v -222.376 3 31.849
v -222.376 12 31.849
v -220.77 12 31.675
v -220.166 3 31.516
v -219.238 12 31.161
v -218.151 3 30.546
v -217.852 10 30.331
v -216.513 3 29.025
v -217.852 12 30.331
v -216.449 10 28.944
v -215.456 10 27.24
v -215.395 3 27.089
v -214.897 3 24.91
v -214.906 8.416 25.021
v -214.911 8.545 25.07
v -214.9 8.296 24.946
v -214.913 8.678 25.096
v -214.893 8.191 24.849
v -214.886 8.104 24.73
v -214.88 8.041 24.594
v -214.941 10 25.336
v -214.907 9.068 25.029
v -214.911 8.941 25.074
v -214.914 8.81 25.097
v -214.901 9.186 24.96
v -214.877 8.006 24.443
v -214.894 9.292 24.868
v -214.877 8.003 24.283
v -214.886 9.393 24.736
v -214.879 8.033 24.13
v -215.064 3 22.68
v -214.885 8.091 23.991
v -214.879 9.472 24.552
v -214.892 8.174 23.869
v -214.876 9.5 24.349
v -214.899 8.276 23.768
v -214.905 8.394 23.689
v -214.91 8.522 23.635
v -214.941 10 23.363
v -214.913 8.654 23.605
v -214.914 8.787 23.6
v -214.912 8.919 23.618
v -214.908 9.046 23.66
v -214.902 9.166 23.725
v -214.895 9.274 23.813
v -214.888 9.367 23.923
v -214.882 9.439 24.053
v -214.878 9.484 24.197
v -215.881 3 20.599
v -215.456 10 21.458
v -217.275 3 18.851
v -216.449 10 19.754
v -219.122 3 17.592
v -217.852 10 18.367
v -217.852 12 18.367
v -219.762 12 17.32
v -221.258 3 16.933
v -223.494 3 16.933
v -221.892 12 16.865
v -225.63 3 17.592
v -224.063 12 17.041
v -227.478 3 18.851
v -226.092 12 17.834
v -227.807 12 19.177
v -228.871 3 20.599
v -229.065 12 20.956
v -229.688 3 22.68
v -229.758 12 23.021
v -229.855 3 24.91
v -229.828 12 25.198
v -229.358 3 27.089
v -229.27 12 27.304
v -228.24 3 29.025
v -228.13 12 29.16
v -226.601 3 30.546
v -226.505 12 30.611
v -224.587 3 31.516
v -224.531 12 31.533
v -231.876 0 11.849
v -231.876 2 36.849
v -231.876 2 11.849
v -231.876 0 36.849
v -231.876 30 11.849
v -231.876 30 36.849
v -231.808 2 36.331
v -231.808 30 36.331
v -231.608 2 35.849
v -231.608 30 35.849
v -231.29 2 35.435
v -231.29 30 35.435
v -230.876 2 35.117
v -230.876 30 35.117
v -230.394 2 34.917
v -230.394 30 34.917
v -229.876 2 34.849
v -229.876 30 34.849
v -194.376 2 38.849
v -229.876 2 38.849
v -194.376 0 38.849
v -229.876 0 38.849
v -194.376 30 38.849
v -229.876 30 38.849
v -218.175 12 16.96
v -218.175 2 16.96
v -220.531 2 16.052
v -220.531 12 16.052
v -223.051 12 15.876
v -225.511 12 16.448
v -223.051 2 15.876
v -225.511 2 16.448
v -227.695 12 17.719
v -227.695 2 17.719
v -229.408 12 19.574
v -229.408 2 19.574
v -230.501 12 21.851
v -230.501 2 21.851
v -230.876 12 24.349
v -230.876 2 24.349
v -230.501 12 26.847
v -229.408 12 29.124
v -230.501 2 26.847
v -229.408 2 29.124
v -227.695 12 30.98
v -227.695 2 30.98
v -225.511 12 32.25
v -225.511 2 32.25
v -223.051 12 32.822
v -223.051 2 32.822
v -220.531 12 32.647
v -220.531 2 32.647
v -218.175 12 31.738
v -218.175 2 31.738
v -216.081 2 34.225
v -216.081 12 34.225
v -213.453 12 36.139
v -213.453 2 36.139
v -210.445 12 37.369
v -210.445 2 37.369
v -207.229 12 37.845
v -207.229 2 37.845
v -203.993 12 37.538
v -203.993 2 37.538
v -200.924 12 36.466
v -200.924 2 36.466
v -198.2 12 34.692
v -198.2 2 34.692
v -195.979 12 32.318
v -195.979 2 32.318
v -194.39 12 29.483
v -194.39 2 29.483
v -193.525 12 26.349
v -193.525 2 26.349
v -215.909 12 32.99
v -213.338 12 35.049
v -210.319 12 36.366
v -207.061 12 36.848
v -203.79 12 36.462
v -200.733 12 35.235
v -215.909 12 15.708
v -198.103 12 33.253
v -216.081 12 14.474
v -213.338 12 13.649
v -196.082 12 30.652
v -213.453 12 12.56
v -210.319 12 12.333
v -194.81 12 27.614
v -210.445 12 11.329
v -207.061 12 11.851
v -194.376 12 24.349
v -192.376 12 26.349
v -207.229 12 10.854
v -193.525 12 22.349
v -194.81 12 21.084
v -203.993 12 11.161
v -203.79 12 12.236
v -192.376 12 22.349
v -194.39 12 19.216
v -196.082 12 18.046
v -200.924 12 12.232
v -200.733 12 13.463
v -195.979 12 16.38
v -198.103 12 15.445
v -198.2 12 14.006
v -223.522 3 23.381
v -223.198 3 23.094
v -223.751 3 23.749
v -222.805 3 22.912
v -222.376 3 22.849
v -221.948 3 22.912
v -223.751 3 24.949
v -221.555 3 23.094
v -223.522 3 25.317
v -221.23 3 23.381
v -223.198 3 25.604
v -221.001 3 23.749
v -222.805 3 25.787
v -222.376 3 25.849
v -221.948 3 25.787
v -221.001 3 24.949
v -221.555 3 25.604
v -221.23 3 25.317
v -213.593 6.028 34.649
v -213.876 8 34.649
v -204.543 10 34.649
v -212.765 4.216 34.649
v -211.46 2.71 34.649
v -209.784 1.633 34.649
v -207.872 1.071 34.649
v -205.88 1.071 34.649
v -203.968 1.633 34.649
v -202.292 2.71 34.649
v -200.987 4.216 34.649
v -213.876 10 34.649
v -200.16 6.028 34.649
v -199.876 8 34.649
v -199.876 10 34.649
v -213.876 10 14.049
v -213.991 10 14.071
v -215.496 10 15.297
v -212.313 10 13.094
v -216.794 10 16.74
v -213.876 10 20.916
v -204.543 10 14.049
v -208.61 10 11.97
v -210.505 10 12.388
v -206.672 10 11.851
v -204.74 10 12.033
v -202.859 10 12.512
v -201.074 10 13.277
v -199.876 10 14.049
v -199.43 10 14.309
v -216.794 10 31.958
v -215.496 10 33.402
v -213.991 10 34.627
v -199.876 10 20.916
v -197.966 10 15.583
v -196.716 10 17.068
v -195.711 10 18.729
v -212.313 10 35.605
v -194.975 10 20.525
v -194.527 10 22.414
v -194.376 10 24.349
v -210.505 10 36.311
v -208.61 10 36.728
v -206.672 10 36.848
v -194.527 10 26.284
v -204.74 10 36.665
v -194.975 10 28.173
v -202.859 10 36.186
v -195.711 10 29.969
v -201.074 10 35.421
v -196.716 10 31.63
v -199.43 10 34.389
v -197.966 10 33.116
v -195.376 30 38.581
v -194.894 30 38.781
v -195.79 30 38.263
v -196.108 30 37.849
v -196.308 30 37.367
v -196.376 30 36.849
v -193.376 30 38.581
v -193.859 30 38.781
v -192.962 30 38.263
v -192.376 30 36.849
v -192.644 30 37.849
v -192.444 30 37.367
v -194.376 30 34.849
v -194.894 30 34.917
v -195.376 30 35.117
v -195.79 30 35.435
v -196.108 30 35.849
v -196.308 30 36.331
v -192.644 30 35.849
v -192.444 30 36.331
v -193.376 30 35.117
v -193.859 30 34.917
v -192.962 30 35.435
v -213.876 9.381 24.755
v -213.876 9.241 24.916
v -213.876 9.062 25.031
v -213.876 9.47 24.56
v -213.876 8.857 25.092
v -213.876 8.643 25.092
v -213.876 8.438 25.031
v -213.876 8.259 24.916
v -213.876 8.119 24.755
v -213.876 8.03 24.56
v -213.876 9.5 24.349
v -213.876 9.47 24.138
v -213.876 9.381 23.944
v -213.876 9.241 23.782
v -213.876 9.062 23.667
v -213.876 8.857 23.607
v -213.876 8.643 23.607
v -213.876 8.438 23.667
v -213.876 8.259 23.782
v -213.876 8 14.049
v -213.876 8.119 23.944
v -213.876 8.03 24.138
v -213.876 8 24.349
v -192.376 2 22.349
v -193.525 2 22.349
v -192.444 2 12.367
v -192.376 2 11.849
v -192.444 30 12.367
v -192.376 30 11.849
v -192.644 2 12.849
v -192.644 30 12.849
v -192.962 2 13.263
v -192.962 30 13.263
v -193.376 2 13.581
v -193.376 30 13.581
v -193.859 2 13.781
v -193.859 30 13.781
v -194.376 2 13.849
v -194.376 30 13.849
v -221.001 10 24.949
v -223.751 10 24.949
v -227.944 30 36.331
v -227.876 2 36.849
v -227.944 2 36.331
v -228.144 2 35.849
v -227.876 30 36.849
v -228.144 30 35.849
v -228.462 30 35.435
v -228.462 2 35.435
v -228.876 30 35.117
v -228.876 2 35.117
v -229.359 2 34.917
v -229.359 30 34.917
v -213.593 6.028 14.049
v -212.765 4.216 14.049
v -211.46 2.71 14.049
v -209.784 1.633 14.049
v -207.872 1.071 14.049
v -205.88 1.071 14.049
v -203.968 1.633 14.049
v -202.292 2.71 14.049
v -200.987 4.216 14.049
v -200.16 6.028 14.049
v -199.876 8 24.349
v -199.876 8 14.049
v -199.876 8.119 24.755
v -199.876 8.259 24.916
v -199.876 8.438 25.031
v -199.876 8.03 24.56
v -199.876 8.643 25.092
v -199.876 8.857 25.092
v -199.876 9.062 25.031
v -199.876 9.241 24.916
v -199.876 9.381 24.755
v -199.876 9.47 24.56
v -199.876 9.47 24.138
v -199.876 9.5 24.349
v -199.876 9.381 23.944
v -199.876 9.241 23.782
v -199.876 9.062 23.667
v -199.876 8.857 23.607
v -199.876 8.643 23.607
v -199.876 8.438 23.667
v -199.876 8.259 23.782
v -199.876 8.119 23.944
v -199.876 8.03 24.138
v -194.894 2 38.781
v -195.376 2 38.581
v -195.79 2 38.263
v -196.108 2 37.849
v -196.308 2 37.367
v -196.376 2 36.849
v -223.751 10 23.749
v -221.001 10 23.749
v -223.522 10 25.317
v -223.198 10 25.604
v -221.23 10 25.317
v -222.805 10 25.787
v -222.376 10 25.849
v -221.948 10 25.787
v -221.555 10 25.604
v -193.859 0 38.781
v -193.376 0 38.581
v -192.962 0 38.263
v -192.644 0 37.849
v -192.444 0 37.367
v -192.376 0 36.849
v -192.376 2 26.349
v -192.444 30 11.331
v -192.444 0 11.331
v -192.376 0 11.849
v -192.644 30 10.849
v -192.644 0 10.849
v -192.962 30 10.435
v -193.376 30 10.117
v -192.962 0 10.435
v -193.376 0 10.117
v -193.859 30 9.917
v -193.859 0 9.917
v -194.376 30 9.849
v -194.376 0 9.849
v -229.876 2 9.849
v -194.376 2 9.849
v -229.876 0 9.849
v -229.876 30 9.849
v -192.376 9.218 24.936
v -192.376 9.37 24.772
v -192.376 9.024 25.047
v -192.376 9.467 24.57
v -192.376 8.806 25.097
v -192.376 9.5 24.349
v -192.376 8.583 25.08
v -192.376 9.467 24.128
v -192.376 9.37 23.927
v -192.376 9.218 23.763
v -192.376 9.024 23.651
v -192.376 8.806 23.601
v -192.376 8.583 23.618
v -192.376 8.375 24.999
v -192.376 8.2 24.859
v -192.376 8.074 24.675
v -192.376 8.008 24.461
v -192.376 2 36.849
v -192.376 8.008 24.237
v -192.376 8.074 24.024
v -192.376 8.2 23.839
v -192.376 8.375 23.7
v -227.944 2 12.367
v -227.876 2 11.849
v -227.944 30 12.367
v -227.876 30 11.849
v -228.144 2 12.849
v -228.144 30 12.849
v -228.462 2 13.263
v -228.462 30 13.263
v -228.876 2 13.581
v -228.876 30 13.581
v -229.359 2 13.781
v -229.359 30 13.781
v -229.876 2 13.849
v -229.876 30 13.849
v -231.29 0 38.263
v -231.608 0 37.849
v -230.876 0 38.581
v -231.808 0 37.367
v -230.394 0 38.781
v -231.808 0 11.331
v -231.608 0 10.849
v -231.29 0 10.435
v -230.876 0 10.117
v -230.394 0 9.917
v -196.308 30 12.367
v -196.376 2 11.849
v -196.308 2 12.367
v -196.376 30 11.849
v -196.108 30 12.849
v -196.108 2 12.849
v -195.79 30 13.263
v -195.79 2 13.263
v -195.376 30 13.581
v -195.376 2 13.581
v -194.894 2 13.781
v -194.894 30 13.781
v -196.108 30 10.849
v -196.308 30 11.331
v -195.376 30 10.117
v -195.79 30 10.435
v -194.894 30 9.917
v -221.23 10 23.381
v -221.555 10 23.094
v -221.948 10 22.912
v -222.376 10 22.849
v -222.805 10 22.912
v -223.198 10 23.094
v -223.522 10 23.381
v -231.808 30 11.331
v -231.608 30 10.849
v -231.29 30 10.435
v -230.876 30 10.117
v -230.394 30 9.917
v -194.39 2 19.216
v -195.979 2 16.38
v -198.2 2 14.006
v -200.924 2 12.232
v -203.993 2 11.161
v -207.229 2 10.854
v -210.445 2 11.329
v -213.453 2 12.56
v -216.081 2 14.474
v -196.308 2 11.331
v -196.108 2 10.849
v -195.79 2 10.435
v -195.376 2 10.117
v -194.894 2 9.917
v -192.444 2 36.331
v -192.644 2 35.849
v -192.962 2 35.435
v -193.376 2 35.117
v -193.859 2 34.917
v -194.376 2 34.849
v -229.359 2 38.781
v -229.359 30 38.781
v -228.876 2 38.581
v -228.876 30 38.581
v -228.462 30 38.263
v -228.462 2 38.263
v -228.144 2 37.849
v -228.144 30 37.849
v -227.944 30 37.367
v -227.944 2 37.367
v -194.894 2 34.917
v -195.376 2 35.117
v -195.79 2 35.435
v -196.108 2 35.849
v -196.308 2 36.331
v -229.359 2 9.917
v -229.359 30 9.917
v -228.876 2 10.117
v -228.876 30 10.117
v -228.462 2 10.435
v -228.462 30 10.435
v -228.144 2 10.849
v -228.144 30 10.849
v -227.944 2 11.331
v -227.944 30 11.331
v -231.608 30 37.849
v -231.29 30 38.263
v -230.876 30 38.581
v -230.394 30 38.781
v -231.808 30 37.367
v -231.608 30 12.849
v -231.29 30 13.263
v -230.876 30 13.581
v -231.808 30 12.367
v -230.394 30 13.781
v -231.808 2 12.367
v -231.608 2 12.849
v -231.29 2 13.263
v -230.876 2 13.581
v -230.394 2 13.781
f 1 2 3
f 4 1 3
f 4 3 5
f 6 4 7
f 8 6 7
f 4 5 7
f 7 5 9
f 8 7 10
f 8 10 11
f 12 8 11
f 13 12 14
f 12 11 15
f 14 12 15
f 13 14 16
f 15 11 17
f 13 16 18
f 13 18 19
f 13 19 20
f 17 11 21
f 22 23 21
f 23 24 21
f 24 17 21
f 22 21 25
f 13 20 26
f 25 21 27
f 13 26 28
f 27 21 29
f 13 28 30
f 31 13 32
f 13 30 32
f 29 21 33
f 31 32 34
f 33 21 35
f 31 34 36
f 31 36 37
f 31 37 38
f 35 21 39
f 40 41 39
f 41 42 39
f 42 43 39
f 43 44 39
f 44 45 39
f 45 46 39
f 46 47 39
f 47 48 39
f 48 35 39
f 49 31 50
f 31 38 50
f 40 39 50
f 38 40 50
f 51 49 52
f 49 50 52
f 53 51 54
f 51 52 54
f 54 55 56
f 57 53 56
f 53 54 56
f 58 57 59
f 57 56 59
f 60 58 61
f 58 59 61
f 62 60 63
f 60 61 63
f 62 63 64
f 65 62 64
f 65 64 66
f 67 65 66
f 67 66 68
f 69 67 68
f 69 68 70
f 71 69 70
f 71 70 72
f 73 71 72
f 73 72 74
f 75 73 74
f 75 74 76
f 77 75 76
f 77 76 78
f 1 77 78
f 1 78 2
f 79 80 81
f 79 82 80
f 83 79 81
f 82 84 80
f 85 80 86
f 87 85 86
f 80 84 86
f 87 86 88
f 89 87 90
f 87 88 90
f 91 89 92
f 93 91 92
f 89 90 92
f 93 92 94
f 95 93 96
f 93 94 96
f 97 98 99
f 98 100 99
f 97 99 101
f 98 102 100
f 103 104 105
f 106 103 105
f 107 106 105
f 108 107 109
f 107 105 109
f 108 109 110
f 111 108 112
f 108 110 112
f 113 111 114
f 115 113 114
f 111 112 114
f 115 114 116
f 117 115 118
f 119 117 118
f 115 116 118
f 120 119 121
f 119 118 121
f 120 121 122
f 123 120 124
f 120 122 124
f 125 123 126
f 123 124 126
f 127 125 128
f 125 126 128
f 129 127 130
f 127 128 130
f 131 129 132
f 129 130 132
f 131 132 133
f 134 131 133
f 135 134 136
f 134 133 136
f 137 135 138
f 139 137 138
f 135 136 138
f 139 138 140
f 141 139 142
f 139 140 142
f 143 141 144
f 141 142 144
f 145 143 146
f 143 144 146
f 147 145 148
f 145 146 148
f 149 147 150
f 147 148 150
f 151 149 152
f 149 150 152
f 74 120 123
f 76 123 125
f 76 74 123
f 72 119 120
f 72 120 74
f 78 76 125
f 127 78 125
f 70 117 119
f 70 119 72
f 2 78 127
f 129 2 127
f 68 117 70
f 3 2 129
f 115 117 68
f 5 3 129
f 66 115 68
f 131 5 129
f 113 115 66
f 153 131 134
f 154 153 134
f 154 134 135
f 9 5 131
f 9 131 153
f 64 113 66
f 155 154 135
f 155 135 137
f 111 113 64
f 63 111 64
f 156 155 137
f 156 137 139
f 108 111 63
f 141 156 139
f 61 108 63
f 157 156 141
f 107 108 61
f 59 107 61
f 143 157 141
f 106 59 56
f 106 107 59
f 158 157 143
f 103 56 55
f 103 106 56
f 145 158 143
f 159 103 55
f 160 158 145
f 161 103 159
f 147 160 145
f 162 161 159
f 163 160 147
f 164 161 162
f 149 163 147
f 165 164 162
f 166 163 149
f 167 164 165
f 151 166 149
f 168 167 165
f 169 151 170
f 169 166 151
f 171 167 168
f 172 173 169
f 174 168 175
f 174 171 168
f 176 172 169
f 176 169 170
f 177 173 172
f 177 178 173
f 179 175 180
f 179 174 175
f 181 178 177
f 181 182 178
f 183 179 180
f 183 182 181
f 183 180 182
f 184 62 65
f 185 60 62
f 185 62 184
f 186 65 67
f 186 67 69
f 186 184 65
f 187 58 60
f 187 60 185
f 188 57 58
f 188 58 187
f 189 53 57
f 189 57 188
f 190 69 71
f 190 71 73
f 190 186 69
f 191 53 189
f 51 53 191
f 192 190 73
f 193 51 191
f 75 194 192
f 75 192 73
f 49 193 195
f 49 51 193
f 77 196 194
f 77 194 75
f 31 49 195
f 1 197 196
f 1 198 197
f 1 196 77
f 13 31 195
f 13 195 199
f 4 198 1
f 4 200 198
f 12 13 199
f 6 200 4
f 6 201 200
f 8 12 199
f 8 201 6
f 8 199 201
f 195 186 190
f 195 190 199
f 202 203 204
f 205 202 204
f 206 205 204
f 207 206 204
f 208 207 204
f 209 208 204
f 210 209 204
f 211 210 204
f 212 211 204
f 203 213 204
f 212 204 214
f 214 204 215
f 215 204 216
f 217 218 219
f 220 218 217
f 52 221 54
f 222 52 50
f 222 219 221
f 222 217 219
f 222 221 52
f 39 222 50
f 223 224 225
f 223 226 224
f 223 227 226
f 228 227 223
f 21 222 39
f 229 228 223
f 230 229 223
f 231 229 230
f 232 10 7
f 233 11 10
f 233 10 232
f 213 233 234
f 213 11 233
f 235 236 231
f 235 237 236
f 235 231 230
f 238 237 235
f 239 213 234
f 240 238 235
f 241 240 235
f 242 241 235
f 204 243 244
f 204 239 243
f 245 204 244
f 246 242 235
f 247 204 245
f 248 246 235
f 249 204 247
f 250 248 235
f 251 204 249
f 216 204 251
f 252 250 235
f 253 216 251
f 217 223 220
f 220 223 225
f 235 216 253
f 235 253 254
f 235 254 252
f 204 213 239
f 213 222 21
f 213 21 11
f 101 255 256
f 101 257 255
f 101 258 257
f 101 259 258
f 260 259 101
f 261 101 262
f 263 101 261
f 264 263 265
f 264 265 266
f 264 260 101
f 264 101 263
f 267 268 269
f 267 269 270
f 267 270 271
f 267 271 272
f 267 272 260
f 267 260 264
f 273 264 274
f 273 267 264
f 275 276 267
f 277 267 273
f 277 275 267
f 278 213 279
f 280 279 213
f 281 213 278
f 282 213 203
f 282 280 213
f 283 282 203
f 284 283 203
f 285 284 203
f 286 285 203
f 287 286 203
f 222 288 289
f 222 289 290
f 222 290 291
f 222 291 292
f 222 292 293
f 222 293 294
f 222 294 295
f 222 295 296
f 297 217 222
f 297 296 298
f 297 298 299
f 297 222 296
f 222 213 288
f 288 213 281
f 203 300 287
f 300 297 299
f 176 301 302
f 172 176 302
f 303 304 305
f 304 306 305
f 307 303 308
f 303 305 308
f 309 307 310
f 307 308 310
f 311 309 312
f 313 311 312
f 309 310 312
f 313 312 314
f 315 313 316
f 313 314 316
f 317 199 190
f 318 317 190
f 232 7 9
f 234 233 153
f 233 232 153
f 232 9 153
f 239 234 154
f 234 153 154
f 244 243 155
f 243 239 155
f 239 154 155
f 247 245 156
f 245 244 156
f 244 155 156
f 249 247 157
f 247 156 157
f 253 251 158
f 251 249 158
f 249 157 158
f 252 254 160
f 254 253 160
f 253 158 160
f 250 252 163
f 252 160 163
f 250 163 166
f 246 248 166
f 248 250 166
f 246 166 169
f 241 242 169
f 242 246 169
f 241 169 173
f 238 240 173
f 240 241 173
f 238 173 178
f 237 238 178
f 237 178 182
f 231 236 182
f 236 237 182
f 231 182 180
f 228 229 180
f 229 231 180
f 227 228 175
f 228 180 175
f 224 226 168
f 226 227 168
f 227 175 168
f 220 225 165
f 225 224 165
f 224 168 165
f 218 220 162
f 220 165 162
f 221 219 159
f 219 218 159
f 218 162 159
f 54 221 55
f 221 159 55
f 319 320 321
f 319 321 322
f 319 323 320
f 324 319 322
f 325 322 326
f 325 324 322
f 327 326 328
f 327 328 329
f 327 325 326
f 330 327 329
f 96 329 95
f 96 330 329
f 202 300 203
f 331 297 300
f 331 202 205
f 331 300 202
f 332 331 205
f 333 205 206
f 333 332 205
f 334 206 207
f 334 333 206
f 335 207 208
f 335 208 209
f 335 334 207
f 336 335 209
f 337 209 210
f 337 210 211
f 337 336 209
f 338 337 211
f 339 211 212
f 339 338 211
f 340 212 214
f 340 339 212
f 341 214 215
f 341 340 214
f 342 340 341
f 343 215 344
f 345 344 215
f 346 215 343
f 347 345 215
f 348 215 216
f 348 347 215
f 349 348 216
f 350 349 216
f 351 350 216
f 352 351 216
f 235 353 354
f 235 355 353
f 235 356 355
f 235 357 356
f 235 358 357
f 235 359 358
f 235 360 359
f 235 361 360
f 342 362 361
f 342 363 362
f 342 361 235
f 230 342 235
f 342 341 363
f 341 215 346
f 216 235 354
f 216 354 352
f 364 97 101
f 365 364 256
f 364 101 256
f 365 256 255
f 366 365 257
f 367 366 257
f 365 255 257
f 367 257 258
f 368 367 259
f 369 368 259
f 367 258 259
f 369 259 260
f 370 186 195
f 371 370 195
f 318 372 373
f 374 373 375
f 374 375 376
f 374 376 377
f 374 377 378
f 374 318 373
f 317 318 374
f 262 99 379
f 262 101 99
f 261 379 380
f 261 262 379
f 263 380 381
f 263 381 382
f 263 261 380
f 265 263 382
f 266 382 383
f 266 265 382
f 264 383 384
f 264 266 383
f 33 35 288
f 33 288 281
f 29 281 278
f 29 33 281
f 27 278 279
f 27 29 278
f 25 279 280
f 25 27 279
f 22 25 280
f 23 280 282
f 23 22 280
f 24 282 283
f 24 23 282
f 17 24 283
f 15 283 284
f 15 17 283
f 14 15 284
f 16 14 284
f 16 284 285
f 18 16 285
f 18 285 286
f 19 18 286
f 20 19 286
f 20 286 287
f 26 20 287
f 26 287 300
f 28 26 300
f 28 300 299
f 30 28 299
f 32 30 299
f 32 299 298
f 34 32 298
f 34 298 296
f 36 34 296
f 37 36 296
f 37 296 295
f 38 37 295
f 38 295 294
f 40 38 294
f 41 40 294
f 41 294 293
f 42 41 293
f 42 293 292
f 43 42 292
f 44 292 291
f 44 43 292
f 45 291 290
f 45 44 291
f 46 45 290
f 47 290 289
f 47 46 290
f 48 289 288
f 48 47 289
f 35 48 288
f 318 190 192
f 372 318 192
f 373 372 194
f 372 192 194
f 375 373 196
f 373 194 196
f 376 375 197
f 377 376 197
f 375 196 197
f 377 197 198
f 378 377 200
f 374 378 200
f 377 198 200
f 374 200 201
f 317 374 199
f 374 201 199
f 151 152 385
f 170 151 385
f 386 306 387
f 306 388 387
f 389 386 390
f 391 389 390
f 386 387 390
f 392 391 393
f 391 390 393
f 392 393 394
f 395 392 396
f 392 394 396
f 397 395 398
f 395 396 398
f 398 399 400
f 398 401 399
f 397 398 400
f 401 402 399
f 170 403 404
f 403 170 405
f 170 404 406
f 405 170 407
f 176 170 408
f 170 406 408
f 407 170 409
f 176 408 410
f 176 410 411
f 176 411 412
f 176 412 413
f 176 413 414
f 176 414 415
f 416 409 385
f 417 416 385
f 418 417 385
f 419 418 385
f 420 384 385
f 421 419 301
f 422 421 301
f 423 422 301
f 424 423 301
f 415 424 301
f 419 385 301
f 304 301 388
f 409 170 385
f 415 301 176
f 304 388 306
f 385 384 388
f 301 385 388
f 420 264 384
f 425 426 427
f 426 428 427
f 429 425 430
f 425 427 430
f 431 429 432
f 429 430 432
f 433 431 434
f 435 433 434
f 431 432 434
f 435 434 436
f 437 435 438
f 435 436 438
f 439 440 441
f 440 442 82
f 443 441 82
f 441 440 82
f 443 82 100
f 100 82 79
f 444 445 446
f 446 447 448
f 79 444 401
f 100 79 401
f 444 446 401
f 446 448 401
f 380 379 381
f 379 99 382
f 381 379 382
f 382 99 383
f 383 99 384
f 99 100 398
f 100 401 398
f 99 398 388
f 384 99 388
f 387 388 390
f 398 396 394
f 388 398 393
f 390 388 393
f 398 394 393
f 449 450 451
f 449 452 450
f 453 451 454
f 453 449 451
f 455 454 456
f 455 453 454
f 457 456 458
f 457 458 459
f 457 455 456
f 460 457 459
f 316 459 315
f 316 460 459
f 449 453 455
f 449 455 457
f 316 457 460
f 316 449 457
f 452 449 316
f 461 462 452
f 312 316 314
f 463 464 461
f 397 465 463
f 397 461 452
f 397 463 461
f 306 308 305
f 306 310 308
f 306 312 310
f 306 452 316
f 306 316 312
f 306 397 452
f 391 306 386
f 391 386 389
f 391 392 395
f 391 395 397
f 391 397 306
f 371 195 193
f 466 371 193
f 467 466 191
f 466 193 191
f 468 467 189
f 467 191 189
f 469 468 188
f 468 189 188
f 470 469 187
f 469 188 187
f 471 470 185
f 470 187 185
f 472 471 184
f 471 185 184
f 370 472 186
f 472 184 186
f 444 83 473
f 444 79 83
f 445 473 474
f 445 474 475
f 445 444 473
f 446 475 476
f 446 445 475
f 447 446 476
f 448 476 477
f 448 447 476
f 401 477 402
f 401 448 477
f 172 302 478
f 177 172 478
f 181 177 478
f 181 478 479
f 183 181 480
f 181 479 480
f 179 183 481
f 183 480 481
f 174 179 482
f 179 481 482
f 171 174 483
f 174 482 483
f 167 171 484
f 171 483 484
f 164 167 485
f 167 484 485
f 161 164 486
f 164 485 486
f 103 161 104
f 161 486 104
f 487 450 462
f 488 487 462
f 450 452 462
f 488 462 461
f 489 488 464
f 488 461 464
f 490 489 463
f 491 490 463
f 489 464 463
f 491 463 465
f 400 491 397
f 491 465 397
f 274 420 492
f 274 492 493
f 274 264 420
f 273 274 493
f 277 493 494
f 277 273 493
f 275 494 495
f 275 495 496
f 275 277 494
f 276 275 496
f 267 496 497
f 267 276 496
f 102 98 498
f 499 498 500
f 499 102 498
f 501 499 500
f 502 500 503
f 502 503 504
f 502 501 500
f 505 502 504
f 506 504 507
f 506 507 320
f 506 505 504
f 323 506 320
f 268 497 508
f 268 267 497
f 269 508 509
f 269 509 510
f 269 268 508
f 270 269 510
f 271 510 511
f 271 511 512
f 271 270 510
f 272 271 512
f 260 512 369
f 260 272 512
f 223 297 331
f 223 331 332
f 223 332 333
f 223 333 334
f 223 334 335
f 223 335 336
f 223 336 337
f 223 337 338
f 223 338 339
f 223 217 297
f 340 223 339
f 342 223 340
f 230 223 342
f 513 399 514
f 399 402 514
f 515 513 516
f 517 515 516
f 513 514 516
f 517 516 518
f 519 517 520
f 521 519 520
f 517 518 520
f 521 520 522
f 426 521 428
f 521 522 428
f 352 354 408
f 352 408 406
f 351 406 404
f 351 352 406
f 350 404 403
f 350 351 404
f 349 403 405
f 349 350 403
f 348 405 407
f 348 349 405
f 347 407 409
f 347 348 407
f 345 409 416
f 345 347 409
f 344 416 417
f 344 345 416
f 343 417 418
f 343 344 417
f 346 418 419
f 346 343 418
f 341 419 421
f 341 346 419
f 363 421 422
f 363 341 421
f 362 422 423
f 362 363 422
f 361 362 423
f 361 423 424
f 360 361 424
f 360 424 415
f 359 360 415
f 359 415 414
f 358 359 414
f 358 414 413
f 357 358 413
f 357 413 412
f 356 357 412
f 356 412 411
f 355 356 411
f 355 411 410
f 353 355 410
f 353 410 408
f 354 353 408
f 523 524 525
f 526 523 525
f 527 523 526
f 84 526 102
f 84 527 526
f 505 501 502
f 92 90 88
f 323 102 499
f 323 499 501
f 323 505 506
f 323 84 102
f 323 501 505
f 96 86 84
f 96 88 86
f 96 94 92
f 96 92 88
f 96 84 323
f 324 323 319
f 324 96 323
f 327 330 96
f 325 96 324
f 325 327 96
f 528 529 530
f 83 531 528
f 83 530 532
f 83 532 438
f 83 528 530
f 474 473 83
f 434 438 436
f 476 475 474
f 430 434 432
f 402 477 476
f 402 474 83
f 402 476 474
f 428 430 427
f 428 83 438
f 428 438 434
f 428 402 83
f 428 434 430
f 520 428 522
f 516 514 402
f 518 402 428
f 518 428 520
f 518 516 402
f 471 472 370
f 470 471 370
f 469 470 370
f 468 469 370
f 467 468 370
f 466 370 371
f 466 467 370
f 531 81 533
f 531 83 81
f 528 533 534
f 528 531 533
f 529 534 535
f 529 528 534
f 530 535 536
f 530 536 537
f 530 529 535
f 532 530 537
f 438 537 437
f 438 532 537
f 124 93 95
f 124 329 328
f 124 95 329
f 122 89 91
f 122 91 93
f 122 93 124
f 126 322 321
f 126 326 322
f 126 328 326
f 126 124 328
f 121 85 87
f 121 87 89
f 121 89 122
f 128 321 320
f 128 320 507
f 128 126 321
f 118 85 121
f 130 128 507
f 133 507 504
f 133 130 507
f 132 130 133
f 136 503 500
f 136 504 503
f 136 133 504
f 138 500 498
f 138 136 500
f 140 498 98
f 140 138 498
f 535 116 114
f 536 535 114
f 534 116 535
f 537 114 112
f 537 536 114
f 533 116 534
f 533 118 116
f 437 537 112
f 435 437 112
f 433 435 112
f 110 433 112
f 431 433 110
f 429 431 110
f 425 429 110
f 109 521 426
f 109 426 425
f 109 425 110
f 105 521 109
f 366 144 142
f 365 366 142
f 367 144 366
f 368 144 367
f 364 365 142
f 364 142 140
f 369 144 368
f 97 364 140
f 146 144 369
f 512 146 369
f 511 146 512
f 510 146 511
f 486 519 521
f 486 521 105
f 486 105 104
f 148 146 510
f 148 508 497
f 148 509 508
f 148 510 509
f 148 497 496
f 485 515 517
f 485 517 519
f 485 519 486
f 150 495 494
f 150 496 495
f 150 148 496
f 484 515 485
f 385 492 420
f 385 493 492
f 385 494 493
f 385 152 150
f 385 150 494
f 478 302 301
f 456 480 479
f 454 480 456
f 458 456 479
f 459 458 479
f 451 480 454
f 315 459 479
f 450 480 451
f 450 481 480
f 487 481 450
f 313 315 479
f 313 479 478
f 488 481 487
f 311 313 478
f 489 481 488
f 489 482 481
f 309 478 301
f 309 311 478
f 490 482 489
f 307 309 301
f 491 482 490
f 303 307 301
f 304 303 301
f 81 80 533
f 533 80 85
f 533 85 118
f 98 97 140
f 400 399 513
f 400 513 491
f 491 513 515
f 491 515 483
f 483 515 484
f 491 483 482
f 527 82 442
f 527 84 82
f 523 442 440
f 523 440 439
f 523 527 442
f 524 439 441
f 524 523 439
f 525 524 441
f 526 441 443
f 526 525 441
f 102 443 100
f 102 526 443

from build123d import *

# Parameters (mm, degrees)
SKETCH1_W            = 39.5
SKETCH1_H            = 29
BOSS_EXTRUDE1_DEPTH  = 2
SKETCH2_R            = 13.5
SKETCH2_R_2          = 8.5
BOSS_EXTRUDE2_DEPTH  = 10
SKETCH3_R            = 12.5
CUT_EXTRUDE1_DEPTH   = 2
SKETCH4_R            = 7.5
CUT_EXTRUDE2_DEPTH   = 9
CUT_EXTRUDE3_START   = -10.3
CUT_EXTRUDE3_DEPTH   = 20.6
BOSS_EXTRUDE3_DEPTH  = 10
CUT_SWEEP1_START     = -214.913833497
CUT_SWEEP1_OUTLINE_R = 0.75
CUT_SWEEP1_DEPTH     = 22.537594322
BOSS_EXTRUDE4_DEPTH  = 7
SKETCH11_W           = 4
SKETCH11_H           = 4
BOSS_EXTRUDE5_DEPTH  = 28
FILLET1_R            = 2


# Read off the part's stored shape, not the designer's step: Cut-Extrude3, Cut-Sweep1
with BuildPart() as part:
    # Sketch1 → Boss-Extrude1 (new body)
    with BuildSketch(Plane(origin=(0, 0, 0), x_dir=(1, 0, 0), z_dir=(0, 1, 0))):
        with Locations((-212.126239175, -24.349172792)):
            Rectangle(SKETCH1_W, SKETCH1_H)
    extrude(amount=BOSS_EXTRUDE1_DEPTH)

    # Sketch2 → Boss-Extrude2 (add)
    with BuildSketch(Plane(origin=(0, 2, 0), x_dir=(1, 0, 0), z_dir=(0, 1, 0))):
        with Locations((-206.876239175, -24.349172792)):
            Circle(SKETCH2_R)
        with Locations((-222.376239175, -24.349172792)):
            Circle(SKETCH2_R_2)
    extrude(amount=BOSS_EXTRUDE2_DEPTH)

    # Sketch3 → Cut-Extrude1 (cut)
    with BuildSketch(Plane(origin=(0, 12, 0), x_dir=(1, 0, 0), z_dir=(0, 1, 0))):
        with Locations(Location((-206.876239175, -24.349172792, 0), (0, 0, 270))):
            Circle(SKETCH3_R)
    extrude(amount=-CUT_EXTRUDE1_DEPTH, mode=Mode.SUBTRACT)

    # Sketch4 → Cut-Extrude2 (cut)
    with BuildSketch(Plane(origin=(0, 12, 0), x_dir=(1, 0, 0), z_dir=(0, 1, 0))):
        with Locations(Location((-222.376239175, -24.349172792, 0), (0, 0, 270))):
            Circle(SKETCH4_R)
    extrude(amount=-CUT_EXTRUDE2_DEPTH, mode=Mode.SUBTRACT)

    # Cut-Extrude3 outline → Cut-Extrude3 (cut)
    with BuildSketch(Plane.XY.offset(24.349172792).offset(CUT_EXTRUDE3_START)):
        with BuildLine():
            ThreePointArc((-213.876239175, 8), (-206.876239175, 1), (-199.876239175, 8))
            Line((-199.876239175, 8), (-199.876239175, 10))
            Line((-199.876239175, 10), (-213.876239175, 10))
            Line((-213.876239175, 10), (-213.876239175, 8))
        make_face()
    extrude(amount=CUT_EXTRUDE3_DEPTH, mode=Mode.SUBTRACT)

    # Sketch7 → Boss-Extrude3 (add)
    with BuildSketch(Plane(origin=(0, 2, 0), x_dir=(1, 0, 0), z_dir=(0, 1, 0))):
        with BuildLine():
            Line((-192.376239175, -26.349172792), (-192.376239175, -24.349172792))
            Line((-192.376239175, -24.349172792), (-192.376239175, -22.349172792))
            Line((-192.376239175, -22.349172792), (-193.525209252, -22.349172792))
            ThreePointArc((-193.525209252, -22.349172792), (-193.413533207, -23.346402619), (-193.376239175, -24.349172792))
            ThreePointArc((-193.376239175, -24.349172792), (-193.413533207, -25.351942966), (-193.525209252, -26.349172792))
            Line((-193.525209252, -26.349172792), (-192.376239175, -26.349172792))
        make_face()
    extrude(amount=BOSS_EXTRUDE3_DEPTH)

    # Cut-Sweep1 outline → Cut-Sweep1 (cut)
    with BuildSketch(Plane.YZ.offset(CUT_SWEEP1_START)):
        with Locations((8.75, 24.349172792)):
            Circle(CUT_SWEEP1_OUTLINE_R)
    extrude(amount=CUT_SWEEP1_DEPTH, mode=Mode.SUBTRACT)

    # Sketch10 → Boss-Extrude4 (add)
    with BuildSketch(Plane(origin=(0, 3, 0), x_dir=(1, 0, 0), z_dir=(0, 1, 0))):
        with BuildLine():
            Line((-223.751011884, -23.749172792), (-222.376239175, -23.749172792))
            Line((-222.376239175, -23.749172792), (-221.001466467, -23.749172792))
            ThreePointArc((-221.001466467, -23.749172792), (-222.376239175, -22.849172792), (-223.751011884, -23.749172792))
        make_face()
        with BuildLine():
            Line((-221.001466467, -24.949172792), (-223.751011884, -24.949172792))
            ThreePointArc((-223.751011884, -24.949172792), (-222.376239175, -25.849172792), (-221.001466467, -24.949172792))
        make_face()
    extrude(amount=BOSS_EXTRUDE4_DEPTH)

    # Sketch11 → Boss-Extrude5 (add)
    with BuildSketch(Plane(origin=(0, 2, 0), x_dir=(1, 0, 0), z_dir=(0, 1, 0))):
        with Locations((-229.876239175, -36.849172792)):
            Rectangle(SKETCH11_W, SKETCH11_H)
        with Locations((-229.876239175, -11.849172792)):
            Rectangle(SKETCH11_W, SKETCH11_H)
        with Locations((-194.376239175, -36.849172792)):
            Rectangle(SKETCH11_W, SKETCH11_H)
        with Locations((-194.376239175, -11.849172792)):
            Rectangle(SKETCH11_W, SKETCH11_H)
    extrude(amount=BOSS_EXTRUDE5_DEPTH)

    # Fillet1
    fillet1_edges = [part.edges().sort_by_distance(p)[0] for p in [
        (-192.376239175, 16, 34.849172792),
        (-192.376239175, 15, 9.849172792),
        (-227.876239175, 16, 9.849172792),
        (-227.876239175, 16, 34.849172792),
        (-192.376239175, 16, 13.849172792),
        (-196.376239175, 16, 13.849172792),
        (-196.376239175, 16, 9.849172792),
        (-192.376239175, 15, 38.849172792),
        (-196.376239175, 16, 38.849172792),
        (-196.376239175, 16, 34.849172792),
        (-227.876239175, 16, 38.849172792),
        (-231.876239175, 15, 38.849172792),
        (-231.876239175, 16, 34.849172792),
        (-227.876239175, 16, 13.849172792),
        (-231.876239175, 16, 13.849172792),
        (-231.876239175, 15, 9.849172792),
    ]]
    fillet(fillet1_edges, radius=FILLET1_R - 0.0001)  # a hair under: the kernel refuses the full size


solid = part.part
